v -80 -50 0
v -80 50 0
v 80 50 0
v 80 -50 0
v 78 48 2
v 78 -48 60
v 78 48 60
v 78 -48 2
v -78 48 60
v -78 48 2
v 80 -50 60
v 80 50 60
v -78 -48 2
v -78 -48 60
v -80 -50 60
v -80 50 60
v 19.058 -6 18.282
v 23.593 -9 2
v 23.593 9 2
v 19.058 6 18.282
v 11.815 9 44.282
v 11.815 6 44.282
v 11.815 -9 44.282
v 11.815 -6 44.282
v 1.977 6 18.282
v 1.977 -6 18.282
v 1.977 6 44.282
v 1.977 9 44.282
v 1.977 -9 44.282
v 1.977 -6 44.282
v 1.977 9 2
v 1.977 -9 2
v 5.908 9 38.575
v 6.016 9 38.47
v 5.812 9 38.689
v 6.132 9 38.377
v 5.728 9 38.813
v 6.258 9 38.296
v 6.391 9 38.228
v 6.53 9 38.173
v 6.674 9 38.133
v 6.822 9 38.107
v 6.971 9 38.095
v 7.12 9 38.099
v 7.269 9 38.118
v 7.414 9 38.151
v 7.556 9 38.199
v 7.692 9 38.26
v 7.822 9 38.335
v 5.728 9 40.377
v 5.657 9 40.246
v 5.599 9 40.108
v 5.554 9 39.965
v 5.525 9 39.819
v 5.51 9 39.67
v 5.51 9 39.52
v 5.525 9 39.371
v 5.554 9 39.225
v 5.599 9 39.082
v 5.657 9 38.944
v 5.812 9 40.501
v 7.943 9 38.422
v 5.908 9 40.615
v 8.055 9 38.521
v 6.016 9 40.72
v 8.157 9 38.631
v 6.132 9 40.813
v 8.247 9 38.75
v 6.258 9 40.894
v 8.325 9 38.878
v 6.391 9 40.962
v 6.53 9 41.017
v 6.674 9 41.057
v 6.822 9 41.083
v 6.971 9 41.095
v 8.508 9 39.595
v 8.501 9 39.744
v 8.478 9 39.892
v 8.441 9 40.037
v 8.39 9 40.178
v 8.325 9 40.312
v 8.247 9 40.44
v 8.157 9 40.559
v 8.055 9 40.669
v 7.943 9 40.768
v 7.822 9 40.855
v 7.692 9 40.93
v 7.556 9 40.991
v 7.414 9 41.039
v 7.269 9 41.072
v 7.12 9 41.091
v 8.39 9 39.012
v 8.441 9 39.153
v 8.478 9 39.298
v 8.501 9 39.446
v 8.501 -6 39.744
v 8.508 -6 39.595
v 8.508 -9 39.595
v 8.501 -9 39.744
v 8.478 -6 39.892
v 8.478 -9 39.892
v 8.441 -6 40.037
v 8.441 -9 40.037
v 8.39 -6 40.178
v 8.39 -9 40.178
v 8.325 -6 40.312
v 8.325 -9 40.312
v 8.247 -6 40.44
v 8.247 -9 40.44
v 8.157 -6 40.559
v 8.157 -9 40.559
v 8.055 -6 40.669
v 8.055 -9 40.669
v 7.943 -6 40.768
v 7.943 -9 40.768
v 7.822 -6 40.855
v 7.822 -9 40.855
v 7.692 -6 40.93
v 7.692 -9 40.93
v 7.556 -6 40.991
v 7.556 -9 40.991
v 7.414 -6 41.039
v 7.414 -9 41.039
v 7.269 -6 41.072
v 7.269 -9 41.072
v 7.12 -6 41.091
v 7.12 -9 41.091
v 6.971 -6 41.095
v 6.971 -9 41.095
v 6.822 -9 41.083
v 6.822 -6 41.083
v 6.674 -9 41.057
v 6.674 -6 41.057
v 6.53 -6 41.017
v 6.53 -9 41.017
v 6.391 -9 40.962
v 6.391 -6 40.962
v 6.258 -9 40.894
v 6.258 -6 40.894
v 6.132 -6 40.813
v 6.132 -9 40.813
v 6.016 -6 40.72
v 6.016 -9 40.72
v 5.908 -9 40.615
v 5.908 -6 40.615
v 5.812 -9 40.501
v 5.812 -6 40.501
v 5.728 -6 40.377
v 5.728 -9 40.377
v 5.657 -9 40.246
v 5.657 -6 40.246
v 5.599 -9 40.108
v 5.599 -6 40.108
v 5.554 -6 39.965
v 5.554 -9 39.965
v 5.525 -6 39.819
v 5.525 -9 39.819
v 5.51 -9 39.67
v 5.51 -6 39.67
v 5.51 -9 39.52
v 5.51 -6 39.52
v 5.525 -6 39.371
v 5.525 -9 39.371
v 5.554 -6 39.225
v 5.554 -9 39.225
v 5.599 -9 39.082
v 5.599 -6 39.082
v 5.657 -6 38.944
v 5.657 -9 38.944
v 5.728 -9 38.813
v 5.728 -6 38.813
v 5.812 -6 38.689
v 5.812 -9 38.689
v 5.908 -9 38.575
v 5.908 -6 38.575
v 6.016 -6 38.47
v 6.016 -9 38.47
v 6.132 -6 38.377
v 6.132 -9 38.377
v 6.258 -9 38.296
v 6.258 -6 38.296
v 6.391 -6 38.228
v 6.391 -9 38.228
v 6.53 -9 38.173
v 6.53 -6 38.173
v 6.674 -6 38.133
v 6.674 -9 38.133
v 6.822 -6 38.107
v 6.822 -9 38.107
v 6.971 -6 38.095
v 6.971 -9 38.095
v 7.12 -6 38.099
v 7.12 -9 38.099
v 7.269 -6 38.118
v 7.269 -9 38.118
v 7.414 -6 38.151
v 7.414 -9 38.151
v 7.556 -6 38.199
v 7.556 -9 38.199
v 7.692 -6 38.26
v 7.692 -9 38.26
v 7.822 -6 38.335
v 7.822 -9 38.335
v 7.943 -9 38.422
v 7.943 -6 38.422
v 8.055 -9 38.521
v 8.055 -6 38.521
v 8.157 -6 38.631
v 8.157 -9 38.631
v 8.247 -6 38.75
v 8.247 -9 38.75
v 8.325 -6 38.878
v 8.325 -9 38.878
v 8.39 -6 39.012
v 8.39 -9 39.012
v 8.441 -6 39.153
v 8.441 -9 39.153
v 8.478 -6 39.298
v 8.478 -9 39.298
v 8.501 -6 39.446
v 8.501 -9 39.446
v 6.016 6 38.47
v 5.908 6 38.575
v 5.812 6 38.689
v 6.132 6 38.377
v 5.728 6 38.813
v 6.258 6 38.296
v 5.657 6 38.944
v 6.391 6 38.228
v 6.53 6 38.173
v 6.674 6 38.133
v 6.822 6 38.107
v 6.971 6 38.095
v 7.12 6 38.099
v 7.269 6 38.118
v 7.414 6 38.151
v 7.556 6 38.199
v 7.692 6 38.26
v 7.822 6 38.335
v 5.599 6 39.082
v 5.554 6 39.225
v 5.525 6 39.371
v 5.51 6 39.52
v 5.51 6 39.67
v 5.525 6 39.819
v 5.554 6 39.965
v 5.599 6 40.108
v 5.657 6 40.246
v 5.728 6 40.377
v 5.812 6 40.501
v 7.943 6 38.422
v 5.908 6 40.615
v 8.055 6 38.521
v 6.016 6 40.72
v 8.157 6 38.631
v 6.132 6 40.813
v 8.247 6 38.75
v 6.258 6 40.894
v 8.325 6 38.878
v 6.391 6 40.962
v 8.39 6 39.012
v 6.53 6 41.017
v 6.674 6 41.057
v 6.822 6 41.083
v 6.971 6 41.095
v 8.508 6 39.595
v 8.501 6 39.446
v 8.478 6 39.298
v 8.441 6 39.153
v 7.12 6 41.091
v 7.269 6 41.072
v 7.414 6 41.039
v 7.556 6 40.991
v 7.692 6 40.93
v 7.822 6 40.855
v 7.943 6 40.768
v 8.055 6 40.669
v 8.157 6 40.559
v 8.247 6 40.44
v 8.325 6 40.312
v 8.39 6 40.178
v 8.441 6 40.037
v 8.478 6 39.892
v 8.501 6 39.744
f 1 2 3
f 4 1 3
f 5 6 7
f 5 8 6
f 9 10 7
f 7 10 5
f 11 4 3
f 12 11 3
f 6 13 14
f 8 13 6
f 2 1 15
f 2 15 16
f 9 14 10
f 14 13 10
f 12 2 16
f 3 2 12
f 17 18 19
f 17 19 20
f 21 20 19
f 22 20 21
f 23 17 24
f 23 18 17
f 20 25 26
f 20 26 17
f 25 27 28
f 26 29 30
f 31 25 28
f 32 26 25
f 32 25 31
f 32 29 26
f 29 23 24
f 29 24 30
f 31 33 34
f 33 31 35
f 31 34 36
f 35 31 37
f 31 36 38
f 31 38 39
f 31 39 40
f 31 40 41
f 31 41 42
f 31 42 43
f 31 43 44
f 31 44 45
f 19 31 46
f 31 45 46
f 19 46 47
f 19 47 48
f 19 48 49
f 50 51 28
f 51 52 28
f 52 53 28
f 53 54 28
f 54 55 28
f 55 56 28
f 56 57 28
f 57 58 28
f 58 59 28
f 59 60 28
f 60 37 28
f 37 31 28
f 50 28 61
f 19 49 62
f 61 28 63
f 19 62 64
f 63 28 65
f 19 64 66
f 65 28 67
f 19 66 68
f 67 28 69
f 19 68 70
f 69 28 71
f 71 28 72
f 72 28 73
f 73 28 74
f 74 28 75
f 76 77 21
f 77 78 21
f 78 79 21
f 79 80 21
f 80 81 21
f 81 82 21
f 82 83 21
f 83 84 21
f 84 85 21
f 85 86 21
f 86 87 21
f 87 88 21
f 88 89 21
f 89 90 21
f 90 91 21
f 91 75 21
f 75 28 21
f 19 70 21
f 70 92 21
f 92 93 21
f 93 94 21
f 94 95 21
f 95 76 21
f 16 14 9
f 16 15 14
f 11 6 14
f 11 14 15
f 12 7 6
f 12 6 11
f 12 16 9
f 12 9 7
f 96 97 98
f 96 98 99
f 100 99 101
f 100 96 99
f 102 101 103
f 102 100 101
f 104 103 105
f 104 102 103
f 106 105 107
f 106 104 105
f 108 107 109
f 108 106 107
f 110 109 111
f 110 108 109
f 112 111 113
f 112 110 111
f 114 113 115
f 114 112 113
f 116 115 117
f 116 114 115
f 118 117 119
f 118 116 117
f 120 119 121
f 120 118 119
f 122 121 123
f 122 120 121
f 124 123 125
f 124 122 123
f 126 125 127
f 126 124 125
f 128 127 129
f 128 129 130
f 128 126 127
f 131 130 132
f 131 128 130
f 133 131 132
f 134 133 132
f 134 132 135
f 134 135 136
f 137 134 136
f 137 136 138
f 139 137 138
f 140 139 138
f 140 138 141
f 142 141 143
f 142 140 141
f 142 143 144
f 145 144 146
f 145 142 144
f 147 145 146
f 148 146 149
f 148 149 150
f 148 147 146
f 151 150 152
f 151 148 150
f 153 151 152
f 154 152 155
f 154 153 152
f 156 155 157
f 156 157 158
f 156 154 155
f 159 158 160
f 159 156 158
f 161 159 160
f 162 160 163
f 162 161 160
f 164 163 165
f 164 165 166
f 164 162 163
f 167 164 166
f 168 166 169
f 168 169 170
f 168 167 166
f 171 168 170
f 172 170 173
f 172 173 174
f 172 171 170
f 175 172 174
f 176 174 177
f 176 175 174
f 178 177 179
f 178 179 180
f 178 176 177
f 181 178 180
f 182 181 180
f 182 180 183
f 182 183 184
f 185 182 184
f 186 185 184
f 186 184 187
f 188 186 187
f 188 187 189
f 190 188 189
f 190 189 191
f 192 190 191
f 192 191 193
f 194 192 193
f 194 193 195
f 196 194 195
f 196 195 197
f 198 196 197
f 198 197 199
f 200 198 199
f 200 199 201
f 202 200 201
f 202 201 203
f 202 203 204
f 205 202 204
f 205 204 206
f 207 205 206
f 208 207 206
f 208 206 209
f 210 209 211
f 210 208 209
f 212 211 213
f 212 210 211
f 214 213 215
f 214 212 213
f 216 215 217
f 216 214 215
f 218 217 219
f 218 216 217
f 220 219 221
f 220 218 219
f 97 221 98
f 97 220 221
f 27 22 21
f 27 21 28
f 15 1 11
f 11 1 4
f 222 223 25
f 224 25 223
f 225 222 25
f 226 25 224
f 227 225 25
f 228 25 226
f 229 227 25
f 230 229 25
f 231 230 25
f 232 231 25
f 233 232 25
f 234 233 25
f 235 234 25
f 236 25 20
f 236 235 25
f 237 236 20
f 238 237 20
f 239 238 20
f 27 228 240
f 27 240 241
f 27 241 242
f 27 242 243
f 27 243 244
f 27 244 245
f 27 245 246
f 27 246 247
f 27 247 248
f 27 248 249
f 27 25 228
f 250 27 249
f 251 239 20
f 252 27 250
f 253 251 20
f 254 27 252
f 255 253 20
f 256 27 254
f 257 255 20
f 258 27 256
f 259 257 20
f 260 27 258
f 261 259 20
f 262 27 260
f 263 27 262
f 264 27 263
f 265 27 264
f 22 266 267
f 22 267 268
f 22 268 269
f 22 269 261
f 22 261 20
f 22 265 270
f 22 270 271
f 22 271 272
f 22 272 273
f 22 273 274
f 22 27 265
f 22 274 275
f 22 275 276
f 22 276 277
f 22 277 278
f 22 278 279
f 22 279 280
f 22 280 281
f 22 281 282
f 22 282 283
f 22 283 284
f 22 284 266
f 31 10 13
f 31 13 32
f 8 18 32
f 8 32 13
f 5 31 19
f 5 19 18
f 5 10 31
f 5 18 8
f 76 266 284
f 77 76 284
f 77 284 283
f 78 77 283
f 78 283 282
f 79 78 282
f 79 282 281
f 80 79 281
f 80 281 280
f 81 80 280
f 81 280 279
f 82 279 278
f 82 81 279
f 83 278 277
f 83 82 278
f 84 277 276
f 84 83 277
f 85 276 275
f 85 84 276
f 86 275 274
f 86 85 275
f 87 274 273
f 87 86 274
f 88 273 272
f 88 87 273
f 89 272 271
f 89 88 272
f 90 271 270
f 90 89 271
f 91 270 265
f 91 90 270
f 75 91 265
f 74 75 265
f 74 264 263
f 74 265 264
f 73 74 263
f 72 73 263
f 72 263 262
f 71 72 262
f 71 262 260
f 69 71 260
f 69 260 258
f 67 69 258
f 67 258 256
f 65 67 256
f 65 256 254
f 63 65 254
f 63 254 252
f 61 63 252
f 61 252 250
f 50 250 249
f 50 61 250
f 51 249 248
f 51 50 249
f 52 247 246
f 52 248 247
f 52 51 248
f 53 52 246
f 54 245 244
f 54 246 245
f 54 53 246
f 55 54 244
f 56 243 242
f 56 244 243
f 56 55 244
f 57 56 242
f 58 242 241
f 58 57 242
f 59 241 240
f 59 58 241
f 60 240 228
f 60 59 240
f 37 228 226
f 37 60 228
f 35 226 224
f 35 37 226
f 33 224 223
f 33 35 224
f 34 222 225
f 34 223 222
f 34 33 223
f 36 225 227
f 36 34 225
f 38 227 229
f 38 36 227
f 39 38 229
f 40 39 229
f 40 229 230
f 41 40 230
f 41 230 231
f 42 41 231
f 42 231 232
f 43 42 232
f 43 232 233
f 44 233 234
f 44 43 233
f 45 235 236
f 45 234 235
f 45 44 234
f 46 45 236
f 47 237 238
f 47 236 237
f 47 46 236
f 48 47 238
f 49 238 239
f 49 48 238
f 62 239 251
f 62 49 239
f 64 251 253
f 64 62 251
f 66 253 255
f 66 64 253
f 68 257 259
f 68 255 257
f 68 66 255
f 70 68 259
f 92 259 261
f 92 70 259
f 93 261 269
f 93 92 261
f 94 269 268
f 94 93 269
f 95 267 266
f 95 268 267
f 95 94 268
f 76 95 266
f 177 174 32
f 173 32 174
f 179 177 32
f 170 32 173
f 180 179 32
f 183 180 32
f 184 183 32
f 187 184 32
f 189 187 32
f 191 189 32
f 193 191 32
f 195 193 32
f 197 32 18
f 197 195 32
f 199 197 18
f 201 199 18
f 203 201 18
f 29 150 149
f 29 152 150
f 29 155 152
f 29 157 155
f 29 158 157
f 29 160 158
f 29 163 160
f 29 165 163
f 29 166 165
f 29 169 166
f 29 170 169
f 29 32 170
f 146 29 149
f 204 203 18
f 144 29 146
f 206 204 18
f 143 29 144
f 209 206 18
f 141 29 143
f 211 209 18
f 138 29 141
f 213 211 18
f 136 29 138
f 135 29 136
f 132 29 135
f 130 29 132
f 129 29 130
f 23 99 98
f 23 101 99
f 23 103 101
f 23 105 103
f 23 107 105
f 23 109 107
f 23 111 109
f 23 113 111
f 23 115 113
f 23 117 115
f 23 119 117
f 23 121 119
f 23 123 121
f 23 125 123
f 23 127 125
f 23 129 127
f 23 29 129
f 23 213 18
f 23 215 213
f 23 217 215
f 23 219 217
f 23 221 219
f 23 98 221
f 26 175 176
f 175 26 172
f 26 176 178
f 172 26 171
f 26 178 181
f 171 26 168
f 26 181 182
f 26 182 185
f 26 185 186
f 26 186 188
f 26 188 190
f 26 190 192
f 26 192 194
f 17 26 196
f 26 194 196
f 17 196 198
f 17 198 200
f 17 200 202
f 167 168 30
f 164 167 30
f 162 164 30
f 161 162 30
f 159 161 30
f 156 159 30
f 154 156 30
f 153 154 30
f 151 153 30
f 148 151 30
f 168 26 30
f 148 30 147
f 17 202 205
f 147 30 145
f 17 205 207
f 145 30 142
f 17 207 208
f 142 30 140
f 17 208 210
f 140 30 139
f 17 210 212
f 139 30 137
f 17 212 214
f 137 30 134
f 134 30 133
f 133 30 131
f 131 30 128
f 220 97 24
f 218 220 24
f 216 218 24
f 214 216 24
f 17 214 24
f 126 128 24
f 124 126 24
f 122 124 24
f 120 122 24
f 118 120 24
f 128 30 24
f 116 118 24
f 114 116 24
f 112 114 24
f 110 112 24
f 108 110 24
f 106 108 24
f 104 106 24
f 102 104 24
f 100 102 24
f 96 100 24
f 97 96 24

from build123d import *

# Parameters (mm, degrees)
F0_W     = 160
F0_H     = 100
F2_DEPTH = 60
F3_T     = -2
F4_R     = 1.5
F5_DEPTH = 9
F6_W     = 66.8862648116
F6_H     = 12
F7_DEPTH = 26


with BuildPart() as f2:
    # F0 (on Top) → F2 (new body)
    with BuildSketch(Plane.XY):
        Rectangle(F0_W, F0_H)
    extrude(amount=F2_DEPTH)

    # F3
    f3_openings = [f2.faces().sort_by_distance(p)[0] for p in [
        (0, 0, 60),
    ]]
    offset(amount=F3_T, openings=f3_openings)

    # F4 (on Front) → F5 (join, symmetric)
    with BuildSketch(Plane.XZ):
        Polygon((1.976594096, 44.2819991666), (1.976594096, 0), (24.1503274081, 0), (11.8152030863, 44.2819991666), align=None)
        with Locations((7.0080704532, 39.5950130723)):
            Circle(F4_R, mode=Mode.SUBTRACT)
    extrude(amount=F5_DEPTH, both=True)

    # F6 (on face) → F7 (cut)
    with BuildSketch(Plane.XY.offset(44.2819991666)):
        with Locations((3.9056837824, 0)):
            Rectangle(F6_W, F6_H)
    extrude(amount=-F7_DEPTH, mode=Mode.SUBTRACT)


solid = f2.part
